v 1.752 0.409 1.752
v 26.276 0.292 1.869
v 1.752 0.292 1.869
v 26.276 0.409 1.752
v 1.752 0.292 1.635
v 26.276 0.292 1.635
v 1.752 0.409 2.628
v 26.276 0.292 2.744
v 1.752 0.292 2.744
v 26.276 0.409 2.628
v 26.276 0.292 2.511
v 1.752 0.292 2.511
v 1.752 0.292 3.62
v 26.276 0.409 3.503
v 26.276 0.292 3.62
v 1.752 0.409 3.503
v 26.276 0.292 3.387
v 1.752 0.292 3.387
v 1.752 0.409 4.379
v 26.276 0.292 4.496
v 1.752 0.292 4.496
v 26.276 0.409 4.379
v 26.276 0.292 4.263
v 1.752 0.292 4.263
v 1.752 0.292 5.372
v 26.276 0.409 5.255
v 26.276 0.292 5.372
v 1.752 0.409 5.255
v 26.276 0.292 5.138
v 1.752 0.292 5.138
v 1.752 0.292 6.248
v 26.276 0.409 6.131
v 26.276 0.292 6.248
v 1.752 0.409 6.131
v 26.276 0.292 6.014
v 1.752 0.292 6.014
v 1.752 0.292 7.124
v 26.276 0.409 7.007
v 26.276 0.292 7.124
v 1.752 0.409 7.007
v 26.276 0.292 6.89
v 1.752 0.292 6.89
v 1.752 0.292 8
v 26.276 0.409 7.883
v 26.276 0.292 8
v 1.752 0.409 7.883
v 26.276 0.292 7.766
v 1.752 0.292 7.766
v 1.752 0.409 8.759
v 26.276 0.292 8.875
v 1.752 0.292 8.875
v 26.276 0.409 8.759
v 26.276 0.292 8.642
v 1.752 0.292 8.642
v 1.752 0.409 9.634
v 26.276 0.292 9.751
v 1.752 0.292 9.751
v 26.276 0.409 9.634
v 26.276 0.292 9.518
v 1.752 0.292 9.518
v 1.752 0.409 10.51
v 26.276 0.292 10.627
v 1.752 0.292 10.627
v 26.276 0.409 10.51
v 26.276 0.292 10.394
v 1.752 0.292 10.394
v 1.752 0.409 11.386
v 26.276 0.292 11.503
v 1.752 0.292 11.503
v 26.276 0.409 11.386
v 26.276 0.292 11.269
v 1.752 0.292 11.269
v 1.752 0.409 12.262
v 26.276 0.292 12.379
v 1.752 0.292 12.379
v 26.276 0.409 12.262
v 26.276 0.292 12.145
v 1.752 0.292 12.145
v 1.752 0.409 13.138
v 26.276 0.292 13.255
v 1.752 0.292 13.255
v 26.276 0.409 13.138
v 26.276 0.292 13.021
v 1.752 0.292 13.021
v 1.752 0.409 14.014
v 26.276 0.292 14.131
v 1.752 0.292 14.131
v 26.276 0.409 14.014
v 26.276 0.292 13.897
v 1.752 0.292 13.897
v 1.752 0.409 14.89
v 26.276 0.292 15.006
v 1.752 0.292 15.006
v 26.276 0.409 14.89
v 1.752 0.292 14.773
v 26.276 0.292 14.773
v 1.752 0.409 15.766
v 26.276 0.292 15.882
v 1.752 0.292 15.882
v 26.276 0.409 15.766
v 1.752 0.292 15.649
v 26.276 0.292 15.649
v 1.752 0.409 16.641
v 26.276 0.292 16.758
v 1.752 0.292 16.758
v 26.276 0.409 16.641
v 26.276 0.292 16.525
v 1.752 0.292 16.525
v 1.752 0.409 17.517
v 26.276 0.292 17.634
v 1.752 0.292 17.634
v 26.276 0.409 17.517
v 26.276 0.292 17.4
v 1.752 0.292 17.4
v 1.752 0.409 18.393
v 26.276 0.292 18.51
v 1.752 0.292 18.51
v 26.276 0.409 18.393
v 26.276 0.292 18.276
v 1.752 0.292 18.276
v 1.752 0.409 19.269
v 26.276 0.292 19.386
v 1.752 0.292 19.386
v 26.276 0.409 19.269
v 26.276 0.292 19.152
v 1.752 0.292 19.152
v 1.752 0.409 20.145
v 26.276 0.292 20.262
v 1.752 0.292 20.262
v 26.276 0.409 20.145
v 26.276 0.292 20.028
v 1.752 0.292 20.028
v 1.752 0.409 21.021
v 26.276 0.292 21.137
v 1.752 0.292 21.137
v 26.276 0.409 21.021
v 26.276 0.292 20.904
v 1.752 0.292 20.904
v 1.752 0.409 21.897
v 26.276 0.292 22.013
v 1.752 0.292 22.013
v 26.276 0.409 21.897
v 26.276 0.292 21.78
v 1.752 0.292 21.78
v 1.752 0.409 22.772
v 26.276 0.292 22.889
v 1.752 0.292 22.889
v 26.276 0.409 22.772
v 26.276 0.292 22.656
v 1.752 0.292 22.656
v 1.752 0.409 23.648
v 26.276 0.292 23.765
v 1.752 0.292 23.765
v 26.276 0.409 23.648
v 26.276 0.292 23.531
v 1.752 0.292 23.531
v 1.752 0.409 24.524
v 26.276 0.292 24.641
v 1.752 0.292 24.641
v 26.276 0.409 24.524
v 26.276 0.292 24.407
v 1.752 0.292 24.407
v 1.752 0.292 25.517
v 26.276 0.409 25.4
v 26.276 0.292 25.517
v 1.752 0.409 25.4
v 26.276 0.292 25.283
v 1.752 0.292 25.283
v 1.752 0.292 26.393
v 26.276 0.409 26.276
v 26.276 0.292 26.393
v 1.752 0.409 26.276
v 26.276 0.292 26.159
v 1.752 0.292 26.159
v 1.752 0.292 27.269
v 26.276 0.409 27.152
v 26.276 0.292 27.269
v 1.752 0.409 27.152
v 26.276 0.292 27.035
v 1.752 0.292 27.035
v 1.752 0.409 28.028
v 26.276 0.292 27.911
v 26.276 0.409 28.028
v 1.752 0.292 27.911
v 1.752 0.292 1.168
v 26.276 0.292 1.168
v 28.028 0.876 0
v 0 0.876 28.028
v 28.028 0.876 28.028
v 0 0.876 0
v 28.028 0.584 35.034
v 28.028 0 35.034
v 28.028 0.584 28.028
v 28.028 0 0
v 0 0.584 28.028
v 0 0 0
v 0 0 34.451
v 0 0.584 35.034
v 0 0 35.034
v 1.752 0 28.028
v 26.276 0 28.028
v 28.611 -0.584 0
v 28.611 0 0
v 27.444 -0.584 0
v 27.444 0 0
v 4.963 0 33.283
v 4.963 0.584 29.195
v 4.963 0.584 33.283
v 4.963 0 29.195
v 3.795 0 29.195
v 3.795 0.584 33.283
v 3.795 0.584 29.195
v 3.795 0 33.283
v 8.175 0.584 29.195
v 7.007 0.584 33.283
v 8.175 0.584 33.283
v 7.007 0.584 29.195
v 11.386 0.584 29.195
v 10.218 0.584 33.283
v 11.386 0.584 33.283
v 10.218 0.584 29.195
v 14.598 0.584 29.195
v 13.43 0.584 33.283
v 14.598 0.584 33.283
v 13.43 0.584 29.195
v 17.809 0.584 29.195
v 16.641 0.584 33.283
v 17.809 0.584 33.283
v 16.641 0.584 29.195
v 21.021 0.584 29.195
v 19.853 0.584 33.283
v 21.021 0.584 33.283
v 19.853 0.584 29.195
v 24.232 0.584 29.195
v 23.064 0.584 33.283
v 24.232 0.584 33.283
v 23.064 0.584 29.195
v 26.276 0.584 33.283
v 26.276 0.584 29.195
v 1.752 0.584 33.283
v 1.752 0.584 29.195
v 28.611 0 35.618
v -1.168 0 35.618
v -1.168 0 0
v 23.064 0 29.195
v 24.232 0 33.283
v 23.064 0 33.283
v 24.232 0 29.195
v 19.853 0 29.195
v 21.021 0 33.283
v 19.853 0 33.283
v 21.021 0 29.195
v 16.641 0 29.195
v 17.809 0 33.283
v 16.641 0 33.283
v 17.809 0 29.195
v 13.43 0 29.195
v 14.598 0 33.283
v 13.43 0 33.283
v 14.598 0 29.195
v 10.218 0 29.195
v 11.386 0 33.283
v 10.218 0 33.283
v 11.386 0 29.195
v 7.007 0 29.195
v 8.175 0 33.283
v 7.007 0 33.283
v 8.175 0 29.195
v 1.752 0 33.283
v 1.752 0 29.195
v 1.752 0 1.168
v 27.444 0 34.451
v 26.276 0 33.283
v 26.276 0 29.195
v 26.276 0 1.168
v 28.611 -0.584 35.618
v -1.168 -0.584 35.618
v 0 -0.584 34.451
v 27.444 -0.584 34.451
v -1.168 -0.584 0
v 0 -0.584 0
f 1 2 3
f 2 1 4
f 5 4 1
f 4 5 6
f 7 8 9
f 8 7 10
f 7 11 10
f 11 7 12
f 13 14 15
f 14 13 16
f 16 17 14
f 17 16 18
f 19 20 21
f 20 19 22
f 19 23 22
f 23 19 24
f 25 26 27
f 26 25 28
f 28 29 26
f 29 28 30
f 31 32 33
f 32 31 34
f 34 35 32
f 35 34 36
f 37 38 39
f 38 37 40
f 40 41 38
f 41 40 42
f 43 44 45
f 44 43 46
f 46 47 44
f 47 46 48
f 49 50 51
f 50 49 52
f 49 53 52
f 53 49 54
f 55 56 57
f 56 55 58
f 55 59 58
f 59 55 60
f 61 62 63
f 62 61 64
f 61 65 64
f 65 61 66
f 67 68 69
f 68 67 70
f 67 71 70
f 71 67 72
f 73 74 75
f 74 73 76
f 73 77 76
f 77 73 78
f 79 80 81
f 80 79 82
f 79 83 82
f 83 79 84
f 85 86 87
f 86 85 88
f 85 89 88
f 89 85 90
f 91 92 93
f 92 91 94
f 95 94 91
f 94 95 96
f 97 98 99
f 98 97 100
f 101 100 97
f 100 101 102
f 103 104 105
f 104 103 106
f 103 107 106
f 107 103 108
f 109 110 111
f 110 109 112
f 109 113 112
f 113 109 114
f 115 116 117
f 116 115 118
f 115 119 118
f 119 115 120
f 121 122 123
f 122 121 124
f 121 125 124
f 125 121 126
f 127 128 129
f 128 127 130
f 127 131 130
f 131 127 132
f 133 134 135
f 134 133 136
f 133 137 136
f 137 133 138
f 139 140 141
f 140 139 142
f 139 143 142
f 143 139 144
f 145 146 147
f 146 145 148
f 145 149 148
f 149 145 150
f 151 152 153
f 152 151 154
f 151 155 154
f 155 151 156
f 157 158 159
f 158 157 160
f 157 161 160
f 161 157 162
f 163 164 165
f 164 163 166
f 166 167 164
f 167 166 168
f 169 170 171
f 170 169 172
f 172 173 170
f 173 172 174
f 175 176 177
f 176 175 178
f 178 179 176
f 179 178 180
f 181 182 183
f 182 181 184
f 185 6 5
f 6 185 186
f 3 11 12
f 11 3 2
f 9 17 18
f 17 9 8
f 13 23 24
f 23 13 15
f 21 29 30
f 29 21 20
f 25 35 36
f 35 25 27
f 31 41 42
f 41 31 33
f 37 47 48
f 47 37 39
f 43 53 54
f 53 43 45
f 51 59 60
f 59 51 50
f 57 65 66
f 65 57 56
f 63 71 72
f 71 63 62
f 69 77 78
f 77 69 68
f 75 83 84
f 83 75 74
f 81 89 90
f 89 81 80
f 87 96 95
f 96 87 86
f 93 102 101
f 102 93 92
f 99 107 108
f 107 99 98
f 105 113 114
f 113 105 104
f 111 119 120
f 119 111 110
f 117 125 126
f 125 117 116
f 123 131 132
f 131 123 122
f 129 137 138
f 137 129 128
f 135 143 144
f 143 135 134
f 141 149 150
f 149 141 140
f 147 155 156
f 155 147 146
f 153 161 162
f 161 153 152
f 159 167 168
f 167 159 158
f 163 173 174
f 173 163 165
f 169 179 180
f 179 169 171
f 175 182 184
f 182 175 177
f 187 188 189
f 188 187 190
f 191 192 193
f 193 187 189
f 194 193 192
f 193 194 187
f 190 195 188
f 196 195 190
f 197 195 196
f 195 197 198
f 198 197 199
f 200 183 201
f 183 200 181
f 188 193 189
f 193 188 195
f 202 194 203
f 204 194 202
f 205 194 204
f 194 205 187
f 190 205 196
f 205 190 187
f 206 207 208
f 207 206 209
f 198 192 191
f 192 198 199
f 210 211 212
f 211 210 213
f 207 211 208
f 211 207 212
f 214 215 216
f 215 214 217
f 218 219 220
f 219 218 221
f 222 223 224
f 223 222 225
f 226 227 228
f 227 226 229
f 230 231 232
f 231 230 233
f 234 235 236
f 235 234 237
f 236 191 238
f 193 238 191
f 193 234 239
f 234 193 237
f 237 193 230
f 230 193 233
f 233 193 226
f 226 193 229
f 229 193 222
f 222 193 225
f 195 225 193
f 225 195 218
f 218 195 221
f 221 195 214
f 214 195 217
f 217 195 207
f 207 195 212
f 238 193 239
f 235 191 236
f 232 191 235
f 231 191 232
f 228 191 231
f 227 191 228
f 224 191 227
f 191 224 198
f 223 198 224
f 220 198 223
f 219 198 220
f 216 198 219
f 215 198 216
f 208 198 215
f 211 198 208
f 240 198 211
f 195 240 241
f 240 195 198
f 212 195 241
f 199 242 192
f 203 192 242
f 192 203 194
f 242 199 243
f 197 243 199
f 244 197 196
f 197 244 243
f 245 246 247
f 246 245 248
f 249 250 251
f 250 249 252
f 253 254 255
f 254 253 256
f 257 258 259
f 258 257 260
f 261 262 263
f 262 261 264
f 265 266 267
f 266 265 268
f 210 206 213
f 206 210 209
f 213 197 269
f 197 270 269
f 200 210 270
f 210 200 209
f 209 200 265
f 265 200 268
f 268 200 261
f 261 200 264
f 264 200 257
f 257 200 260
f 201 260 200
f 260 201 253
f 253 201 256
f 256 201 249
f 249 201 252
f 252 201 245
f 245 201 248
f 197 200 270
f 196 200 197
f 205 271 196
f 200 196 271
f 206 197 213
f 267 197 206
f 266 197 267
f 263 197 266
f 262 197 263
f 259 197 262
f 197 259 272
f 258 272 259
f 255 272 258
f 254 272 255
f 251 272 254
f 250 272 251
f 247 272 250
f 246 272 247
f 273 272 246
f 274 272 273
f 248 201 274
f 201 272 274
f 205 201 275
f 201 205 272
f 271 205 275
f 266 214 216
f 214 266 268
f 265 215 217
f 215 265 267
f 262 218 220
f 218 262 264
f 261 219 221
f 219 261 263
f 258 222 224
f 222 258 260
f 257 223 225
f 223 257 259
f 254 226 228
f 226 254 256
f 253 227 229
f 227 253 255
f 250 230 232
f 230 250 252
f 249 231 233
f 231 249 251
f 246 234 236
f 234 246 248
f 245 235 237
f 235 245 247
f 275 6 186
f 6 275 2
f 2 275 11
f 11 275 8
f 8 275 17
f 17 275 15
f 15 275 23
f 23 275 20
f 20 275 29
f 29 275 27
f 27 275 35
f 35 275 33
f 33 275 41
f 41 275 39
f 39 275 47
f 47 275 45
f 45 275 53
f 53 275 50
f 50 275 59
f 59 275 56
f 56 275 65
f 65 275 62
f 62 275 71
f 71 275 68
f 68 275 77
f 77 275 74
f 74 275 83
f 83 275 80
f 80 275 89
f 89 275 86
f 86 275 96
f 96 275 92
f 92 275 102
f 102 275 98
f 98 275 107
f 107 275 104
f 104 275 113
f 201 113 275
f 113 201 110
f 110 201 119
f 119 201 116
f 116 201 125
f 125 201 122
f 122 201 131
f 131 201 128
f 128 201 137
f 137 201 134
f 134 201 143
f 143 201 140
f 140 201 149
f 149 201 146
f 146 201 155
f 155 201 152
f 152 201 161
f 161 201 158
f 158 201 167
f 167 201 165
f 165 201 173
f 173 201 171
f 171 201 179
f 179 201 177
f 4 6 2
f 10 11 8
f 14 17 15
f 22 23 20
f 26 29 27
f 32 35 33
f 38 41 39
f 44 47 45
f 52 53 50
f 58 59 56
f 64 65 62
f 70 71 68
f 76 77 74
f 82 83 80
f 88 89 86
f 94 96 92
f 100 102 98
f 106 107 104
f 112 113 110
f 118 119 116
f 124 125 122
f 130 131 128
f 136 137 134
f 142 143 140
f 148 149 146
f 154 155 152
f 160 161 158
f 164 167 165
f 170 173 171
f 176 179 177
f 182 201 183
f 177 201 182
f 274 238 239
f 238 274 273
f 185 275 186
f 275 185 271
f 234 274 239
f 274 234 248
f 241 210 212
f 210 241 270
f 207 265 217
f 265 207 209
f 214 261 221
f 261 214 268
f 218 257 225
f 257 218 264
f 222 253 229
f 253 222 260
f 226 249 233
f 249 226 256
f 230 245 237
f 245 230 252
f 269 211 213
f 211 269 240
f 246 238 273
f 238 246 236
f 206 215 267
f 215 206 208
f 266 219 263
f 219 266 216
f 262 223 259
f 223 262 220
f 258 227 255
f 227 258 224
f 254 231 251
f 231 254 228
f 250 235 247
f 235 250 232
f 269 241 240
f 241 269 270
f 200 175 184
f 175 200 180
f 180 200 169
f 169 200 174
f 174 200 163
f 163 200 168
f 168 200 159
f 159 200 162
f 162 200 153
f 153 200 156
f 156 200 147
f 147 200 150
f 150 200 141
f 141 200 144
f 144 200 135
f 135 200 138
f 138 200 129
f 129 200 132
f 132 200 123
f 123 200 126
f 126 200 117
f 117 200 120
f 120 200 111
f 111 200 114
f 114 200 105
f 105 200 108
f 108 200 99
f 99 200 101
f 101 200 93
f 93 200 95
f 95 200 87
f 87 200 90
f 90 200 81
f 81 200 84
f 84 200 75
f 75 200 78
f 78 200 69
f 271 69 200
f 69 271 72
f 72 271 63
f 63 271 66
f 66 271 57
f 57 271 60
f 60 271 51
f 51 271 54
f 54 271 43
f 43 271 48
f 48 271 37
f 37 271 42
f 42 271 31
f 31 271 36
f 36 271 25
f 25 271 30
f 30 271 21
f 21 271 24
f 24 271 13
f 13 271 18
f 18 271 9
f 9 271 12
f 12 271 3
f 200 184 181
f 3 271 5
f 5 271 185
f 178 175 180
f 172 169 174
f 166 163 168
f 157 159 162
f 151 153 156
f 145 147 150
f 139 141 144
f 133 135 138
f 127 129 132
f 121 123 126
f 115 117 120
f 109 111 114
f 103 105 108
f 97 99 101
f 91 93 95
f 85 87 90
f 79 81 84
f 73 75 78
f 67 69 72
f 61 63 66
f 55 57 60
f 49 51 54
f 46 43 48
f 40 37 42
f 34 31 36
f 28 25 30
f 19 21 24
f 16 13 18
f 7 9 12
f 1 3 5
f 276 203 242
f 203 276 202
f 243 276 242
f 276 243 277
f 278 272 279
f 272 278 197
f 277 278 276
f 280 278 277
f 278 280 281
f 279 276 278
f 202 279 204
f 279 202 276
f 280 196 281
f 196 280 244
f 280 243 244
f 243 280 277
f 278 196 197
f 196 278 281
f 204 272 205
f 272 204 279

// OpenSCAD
// file: siding.scad
/* clapboard - makes clapboard walls

Usage:
	use <path/to/siding.scad>
	...
	clapboard(
		width=10, //how wide, in units
		height=5, //how tall, in boards
		boardwidth=1, //individual board width
		boardthickness=0.1, //individual board thickness
		pitch=5, //angle of board pitch, in degrees
	);
	
The numbers given above are the defaults if you just do
clapboard();  define them to suit your scale and clapboard style.

This module just presents the clapboard planks; to make a 
complete wall with a smooth back, union it with a cube of 
the width, height, and boardwidth of the clapboard pattern.
The example use code at the bottom of this file demonstrates this;
uncomment the cube() line by removing the two forward slashes 
(//).
	
To use in other programs, create your clapboard pattern in the 
required dimensions and export as a .STL file.  Note that
this will lose the color definition.

*/

module clapboard(width=10, height=5, boardwidth=1, boardthickness=0.1, pitch=5)
{
	translate([0,0,boardthickness]) //move the whole thing up above Z=0
		for (board = [0:1:height-1]) // number of boards, given by height
			translate ([0,board*boardwidth,0]) rotate([-pitch,0,0]) cube ([width, boardwidth, boardthickness]);
	
}

/* planksiding_old - makes plank walls

Usage:
	use <path/to/siding.scad>
	...
	planksiding(
		width=10, //how wide, in units
		height=5, //how tall, in boards
		boardwidth=1, //individual board width
		boardthickness=0.1, //individual board thickness
		notch=0.4,  //depth of the notch in the board interfaces,
					// 0=no notch, 1=notch is full depth of board.
	);
	
The numbers given above are the defaults if you just do
planksiding();  define them to suit your scale and clapboard 
style.
	
To use in other programs, create your planksiding in the 
required dimensions and export as a .STL file.  Note that
this will lose the color definition.

*/

module planksiding_old(width=10, height=5, boardwidth=1, boardthickness=0.1, notch=0.4)
{	
	difference() {
		cube([width, height*boardwidth, boardthickness]);
		union() {
			for (board = [0:1:height])
				translate ([-width/2,board*boardwidth,boardthickness-(boardthickness * notch)]) 
					rotate([45,0,0]) cube (size=[width*2, boardthickness*3, boardthickness*3]);
		}
	}
}


/* planksiding - makes plank walls

Usage:
	use <path/to/siding.scad>
	...
	planksiding(
		width=10, //how wide, in units
		height=5, //how tall, in units
		boardwidth=4, //individual board width
		boardthickness=1, //individual board thickness
		notch=0.3,  //depth of the notch in the board interfaces,
					// 0=no notch, 1=notch is full depth of board.
	);
	
The numbers given above are the defaults if you just do
planksiding();  define them to suit your scale and clapboard 
style.
	
To use in other programs, create your planksiding in the 
required dimensions and export as a .STL file.

*/


module planksiding(width=10*12, height=5*12, boardwidth=4, boardthickness=1, notch=0.3)
{	
	difference() {
		cube([width, height, boardthickness]);
		union() {
			for (board = [0:1:height/boardwidth])
				translate ([-width/2,board*boardwidth,boardthickness-(boardthickness * notch)]) 
					rotate([45,0,0]) cube (size=[width*2, boardthickness*3, boardthickness*3]);
		}
	}
}

//clapboard();
planksiding();
// file: wainscotting.scad
use <siding.scad>

module wainscotting(width=5*12, height=3*12, boardwidth=3, boardthickness=2, rotation=45) {
		o = width > height ? width*2 : height*2;
		rotate([90,0,0])
		translate([width/2,height/2,-boardthickness])
		intersection() {
			rotate([0,0,rotation])
				translate([-o/2, -o/2,0]) 
					planksiding(width=o, height=o, boardwidth=boardwidth, boardthickness=boardthickness, notch=0.2);
			translate([-width/2,-height/2,-boardthickness]) 
				cube([width, height, boardthickness*2]);
		}
}

//wainscotting();
wallthick=6;
//wainscotting(width=5*12, height=3*12, boardwidth=3, boardthickness=2, rotation=45);
wainscotting(width=2*12+wallthick*2, height=3*12, boardwidth=3, boardthickness=1,  rotation=-45);
// main file
use <wainscotting.scad>

//Width of the wall opening into which the door will be inserted
opening_width=96;
//Height of the wall opening into which the door will be inserted
opening_height=120;
//Height of the transom, subtracted from the opening height
transom_height=24;
//Number of transom windows
transomwindow_quantity=3;
//Width of the boards used to make the door frame
board_width=4;
//Thickness of the boards used to make the door frame
board_thickness=2;
//How deep is the door in the frame
doorinset=2;
//The angle of the door planks
rotation=0;
//Use this to print the window with/without the spacing to allow inserting a printed window into a separate wall
inset=1;
//The modeling scale of the .stl file.  Specifies the denominator of the scale, e.g., 1/87 for HO scale, the default.  Assumes the dimensions specified in the previous parameters are prototype, e.g. 1:1.
modeling_scale=87;
//Scales the model for printing.  Default is 25.4, the multiplier to convert decimal inches to millimeters.
printing_scale=25.4;


module freight_door(opening_width=8*12, height=10*12, transom_height=2*12, transomwindow_quantity=8, boardwidth=4, boardthickness=2, doorinset=2, rotation=0) {
	//door core:
	translate([0,boardthickness/2,0])
		wainscotting(width=opening_width, height=height-transom_height, boardwidth=3, rotation=rotation);

	//horizontal door border:
	translate([0,0,0]) 
		cube([opening_width,boardthickness,boardwidth]);
	translate([0,0,height-transom_height]) 
		cube([opening_width,boardthickness,boardwidth]);
	translate([0,0,height-boardwidth-boardthickness]) 
		cube([opening_width,boardthickness,boardwidth+boardthickness]);

	//vertical door border
	translate([0,0,0]) 
		cube([boardwidth+boardthickness,boardthickness,height]);
	translate([opening_width-boardwidth-boardthickness,0,0]) 	
		cube([boardwidth+boardthickness,boardthickness,height]);
	
	//transom windows:
	transomwindow_width = (opening_width-boardwidth-boardthickness*2)/ transomwindow_quantity;
	for (i = [1:1:transomwindow_quantity])
		translate([(i*transomwindow_width)+boardthickness,0,height-transom_height]) 
			cube([boardwidth,boardthickness,transom_height]);

	//door frame:
	translate([-boardwidth/2,-boardwidth/2,height-boardwidth/2])
		cube([opening_width+boardwidth,boardthickness,boardwidth]);
	translate([0,-boardwidth/2,0])
		rotate([0,-90,0])
			cube([height+boardwidth/2,boardthickness,boardwidth]);
	translate([opening_width+boardthickness,-boardwidth/2,0])
		rotate([0,-90,0])
			cube([height+boardwidth/2,boardthickness,boardwidth]);

}

scale(printing_scale)
	scale(1/modeling_scale)
		freight_door();
